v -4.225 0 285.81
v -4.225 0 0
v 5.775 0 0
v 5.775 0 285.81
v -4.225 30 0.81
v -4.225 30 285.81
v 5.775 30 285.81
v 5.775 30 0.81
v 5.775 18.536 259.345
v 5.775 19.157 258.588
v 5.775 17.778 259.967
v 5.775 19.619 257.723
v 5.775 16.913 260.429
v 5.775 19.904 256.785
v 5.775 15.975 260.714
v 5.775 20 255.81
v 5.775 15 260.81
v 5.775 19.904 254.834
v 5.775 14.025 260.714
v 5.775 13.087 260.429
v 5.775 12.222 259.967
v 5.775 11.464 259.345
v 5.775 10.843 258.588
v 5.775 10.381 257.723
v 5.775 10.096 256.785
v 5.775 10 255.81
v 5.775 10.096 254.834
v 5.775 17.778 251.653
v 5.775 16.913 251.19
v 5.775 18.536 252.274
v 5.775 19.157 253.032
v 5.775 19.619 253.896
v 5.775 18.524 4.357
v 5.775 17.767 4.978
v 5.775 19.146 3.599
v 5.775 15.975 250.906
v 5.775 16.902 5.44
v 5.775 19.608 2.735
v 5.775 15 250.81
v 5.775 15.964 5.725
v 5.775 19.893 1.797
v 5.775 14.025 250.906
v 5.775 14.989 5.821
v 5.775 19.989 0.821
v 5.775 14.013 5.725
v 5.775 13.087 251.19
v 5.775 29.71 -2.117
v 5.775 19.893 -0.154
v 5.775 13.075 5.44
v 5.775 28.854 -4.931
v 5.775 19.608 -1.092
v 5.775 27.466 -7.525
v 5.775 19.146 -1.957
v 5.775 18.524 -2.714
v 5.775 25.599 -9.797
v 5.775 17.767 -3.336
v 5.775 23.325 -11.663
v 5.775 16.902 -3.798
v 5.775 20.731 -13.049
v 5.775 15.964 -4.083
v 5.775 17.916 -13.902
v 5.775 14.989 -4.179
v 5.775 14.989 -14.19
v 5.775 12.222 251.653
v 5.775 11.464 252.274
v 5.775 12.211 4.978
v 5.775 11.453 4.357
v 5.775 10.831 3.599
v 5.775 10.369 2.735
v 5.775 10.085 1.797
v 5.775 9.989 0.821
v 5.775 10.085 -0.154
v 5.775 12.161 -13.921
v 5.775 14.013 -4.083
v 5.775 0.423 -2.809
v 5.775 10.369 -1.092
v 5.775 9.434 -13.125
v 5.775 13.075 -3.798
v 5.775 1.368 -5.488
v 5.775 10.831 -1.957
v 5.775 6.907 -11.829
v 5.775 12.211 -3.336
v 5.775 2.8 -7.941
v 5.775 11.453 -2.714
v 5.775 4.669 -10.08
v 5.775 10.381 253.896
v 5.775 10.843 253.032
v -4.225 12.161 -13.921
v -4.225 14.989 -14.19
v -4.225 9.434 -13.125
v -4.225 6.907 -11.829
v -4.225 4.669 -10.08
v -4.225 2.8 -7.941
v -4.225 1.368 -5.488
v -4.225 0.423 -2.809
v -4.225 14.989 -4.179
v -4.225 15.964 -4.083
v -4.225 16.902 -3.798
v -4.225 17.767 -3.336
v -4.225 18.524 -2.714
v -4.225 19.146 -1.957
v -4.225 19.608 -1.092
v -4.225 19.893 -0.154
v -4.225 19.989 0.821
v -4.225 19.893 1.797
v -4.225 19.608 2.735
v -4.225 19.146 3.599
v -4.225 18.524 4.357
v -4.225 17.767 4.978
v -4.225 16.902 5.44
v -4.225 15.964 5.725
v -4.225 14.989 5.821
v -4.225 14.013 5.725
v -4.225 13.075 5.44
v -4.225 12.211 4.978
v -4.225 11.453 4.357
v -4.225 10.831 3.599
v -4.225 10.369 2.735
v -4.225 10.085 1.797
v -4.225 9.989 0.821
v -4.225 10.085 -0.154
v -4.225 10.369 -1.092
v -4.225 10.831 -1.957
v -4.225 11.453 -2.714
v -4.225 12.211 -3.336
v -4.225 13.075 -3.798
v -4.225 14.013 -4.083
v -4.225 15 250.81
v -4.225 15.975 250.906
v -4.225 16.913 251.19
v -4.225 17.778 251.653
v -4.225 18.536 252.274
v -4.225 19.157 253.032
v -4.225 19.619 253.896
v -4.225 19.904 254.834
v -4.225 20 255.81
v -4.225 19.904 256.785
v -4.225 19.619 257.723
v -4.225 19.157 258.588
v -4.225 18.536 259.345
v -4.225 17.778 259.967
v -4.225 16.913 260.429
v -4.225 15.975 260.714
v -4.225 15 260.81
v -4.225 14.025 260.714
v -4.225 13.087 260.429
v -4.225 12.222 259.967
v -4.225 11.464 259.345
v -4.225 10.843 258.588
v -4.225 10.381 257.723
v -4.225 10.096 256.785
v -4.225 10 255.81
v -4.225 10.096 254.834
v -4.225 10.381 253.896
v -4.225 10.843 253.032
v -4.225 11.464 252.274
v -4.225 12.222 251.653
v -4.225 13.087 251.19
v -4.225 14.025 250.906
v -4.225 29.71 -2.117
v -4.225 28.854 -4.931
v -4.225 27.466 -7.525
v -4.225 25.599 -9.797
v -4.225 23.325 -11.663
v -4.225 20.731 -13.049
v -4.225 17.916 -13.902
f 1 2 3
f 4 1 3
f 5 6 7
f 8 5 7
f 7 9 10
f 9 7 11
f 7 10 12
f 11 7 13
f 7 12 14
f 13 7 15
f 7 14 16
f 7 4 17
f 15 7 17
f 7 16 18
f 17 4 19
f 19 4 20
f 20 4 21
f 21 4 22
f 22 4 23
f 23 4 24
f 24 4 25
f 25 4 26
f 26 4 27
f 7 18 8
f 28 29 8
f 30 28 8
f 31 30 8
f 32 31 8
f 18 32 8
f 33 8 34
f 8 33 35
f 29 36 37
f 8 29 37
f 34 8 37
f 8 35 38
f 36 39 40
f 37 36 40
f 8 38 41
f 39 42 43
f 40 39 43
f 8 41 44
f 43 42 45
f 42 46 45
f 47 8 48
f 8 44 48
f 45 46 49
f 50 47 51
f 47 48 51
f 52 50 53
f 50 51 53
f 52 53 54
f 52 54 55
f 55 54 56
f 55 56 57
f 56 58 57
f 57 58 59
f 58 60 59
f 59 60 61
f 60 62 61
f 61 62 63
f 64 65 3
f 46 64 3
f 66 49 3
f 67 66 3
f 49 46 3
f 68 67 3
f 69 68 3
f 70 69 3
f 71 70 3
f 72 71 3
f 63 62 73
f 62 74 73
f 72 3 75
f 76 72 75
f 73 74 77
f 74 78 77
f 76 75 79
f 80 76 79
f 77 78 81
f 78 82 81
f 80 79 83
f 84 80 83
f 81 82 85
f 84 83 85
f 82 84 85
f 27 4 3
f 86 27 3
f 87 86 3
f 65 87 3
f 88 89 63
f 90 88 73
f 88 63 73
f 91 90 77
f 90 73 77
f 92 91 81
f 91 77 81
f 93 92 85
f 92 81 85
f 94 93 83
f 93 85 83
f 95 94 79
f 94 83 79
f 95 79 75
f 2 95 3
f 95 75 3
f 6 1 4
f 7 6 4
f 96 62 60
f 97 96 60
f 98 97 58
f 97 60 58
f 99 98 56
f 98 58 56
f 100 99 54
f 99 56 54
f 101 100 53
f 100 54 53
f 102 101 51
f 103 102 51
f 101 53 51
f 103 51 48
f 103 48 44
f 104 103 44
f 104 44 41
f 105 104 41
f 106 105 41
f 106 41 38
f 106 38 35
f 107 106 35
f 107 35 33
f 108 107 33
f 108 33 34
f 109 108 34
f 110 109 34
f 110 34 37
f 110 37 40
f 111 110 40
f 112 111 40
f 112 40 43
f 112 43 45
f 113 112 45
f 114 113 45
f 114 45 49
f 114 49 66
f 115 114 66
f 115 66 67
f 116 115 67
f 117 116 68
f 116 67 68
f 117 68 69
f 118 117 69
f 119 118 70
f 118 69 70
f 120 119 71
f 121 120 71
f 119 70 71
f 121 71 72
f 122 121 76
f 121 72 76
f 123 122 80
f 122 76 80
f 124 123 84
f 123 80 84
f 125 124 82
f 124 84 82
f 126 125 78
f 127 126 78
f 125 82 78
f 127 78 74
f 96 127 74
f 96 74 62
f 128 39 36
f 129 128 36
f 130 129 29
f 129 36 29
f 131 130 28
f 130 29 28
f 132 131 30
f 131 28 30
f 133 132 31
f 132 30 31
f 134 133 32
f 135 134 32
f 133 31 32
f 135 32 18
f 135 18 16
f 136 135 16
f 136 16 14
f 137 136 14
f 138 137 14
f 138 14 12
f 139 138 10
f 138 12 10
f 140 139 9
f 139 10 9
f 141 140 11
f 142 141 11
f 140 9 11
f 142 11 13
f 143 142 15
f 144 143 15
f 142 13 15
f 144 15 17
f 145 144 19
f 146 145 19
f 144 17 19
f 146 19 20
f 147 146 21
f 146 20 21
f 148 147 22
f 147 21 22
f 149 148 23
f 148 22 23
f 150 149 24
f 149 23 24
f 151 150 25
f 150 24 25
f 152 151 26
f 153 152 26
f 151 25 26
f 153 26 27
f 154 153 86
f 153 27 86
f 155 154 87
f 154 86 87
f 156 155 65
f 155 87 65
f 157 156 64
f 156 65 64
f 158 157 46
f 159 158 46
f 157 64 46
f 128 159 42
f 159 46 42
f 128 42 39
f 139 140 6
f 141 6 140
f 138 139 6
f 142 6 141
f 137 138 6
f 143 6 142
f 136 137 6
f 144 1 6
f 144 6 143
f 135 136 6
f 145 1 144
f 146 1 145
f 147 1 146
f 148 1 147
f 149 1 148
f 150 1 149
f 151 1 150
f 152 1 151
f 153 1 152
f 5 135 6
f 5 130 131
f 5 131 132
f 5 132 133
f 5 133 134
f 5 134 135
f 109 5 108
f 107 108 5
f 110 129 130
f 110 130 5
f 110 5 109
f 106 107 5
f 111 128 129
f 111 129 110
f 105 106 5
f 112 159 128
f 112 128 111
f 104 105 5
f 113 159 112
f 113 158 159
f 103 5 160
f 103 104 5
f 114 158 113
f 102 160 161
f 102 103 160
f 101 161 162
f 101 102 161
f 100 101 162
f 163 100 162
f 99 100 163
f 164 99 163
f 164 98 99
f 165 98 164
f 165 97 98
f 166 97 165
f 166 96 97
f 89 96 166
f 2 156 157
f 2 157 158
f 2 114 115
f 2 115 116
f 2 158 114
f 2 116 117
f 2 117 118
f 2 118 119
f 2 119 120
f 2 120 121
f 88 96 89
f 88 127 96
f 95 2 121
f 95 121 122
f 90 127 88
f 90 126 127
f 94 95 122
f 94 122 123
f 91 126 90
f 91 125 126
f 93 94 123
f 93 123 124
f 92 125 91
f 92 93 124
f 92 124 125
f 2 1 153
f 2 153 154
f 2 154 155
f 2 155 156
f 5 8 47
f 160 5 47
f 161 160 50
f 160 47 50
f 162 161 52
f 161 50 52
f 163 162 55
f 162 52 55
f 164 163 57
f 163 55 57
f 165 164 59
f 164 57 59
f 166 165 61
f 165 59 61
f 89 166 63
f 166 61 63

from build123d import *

# Parameters (mm, degrees)
SKETCH_1_W          = 10
SKETCH_1_H          = 300
EXTRUDE_2_DEPTH     = 30
SKETCH_3_R          = 5
CUT_EXTRUDE_3_DEPTH = 30
SKETCH_4_R          = 5
CUT_EXTRUDE_4_DEPTH = 10


with BuildPart() as part:
    # Эскиз1 → Бобышка-Вытянуть2 (new body)
    with BuildSketch(Plane(origin=(0, 0, 0), x_dir=(1, 0, 0), z_dir=(0, 1, 0))):
        with Locations((0.774647887, -135.809859155)):
            Rectangle(SKETCH_1_W, SKETCH_1_H)
    extrude(amount=EXTRUDE_2_DEPTH)

    # Эскиз3 → Вырез-Вытянуть3 (cut)
    with BuildSketch(Plane(origin=(5.774647887, 0, 0), x_dir=(0, 0, -1), z_dir=(1, 0, 0))):
        with BuildLine():
            ThreePointArc((-0.809859155, 30), (9.797423551, 25.599339913), (14.190140845, 14.988765453))
            Line((14.190140845, 14.988765453), (14.190140845, 30))
            Line((14.190140845, 30), (-0.809859155, 30))
        make_face()
        with BuildLine():
            Line((0, 0), (14.190140845, 0))
            Line((14.190140845, 0), (14.190140845, 14.988765453))
            ThreePointArc((14.190140845, 14.988765453), (10.079887974, 4.668600871), (0, 0))
        make_face()
        with Locations((-0.821097954, 14.988765408)):
            Circle(SKETCH_3_R)
    extrude(amount=-CUT_EXTRUDE_3_DEPTH, mode=Mode.SUBTRACT)

    # Эскиз4 → Вырез-Вытянуть4 (cut)
    with BuildSketch(Plane(origin=(5.774647887, 0, 0), x_dir=(0, 0, -1), z_dir=(1, 0, 0))):
        with Locations((-255.809859155, 15)):
            Circle(SKETCH_4_R)
    extrude(amount=-CUT_EXTRUDE_4_DEPTH, mode=Mode.SUBTRACT)


solid = part.part
